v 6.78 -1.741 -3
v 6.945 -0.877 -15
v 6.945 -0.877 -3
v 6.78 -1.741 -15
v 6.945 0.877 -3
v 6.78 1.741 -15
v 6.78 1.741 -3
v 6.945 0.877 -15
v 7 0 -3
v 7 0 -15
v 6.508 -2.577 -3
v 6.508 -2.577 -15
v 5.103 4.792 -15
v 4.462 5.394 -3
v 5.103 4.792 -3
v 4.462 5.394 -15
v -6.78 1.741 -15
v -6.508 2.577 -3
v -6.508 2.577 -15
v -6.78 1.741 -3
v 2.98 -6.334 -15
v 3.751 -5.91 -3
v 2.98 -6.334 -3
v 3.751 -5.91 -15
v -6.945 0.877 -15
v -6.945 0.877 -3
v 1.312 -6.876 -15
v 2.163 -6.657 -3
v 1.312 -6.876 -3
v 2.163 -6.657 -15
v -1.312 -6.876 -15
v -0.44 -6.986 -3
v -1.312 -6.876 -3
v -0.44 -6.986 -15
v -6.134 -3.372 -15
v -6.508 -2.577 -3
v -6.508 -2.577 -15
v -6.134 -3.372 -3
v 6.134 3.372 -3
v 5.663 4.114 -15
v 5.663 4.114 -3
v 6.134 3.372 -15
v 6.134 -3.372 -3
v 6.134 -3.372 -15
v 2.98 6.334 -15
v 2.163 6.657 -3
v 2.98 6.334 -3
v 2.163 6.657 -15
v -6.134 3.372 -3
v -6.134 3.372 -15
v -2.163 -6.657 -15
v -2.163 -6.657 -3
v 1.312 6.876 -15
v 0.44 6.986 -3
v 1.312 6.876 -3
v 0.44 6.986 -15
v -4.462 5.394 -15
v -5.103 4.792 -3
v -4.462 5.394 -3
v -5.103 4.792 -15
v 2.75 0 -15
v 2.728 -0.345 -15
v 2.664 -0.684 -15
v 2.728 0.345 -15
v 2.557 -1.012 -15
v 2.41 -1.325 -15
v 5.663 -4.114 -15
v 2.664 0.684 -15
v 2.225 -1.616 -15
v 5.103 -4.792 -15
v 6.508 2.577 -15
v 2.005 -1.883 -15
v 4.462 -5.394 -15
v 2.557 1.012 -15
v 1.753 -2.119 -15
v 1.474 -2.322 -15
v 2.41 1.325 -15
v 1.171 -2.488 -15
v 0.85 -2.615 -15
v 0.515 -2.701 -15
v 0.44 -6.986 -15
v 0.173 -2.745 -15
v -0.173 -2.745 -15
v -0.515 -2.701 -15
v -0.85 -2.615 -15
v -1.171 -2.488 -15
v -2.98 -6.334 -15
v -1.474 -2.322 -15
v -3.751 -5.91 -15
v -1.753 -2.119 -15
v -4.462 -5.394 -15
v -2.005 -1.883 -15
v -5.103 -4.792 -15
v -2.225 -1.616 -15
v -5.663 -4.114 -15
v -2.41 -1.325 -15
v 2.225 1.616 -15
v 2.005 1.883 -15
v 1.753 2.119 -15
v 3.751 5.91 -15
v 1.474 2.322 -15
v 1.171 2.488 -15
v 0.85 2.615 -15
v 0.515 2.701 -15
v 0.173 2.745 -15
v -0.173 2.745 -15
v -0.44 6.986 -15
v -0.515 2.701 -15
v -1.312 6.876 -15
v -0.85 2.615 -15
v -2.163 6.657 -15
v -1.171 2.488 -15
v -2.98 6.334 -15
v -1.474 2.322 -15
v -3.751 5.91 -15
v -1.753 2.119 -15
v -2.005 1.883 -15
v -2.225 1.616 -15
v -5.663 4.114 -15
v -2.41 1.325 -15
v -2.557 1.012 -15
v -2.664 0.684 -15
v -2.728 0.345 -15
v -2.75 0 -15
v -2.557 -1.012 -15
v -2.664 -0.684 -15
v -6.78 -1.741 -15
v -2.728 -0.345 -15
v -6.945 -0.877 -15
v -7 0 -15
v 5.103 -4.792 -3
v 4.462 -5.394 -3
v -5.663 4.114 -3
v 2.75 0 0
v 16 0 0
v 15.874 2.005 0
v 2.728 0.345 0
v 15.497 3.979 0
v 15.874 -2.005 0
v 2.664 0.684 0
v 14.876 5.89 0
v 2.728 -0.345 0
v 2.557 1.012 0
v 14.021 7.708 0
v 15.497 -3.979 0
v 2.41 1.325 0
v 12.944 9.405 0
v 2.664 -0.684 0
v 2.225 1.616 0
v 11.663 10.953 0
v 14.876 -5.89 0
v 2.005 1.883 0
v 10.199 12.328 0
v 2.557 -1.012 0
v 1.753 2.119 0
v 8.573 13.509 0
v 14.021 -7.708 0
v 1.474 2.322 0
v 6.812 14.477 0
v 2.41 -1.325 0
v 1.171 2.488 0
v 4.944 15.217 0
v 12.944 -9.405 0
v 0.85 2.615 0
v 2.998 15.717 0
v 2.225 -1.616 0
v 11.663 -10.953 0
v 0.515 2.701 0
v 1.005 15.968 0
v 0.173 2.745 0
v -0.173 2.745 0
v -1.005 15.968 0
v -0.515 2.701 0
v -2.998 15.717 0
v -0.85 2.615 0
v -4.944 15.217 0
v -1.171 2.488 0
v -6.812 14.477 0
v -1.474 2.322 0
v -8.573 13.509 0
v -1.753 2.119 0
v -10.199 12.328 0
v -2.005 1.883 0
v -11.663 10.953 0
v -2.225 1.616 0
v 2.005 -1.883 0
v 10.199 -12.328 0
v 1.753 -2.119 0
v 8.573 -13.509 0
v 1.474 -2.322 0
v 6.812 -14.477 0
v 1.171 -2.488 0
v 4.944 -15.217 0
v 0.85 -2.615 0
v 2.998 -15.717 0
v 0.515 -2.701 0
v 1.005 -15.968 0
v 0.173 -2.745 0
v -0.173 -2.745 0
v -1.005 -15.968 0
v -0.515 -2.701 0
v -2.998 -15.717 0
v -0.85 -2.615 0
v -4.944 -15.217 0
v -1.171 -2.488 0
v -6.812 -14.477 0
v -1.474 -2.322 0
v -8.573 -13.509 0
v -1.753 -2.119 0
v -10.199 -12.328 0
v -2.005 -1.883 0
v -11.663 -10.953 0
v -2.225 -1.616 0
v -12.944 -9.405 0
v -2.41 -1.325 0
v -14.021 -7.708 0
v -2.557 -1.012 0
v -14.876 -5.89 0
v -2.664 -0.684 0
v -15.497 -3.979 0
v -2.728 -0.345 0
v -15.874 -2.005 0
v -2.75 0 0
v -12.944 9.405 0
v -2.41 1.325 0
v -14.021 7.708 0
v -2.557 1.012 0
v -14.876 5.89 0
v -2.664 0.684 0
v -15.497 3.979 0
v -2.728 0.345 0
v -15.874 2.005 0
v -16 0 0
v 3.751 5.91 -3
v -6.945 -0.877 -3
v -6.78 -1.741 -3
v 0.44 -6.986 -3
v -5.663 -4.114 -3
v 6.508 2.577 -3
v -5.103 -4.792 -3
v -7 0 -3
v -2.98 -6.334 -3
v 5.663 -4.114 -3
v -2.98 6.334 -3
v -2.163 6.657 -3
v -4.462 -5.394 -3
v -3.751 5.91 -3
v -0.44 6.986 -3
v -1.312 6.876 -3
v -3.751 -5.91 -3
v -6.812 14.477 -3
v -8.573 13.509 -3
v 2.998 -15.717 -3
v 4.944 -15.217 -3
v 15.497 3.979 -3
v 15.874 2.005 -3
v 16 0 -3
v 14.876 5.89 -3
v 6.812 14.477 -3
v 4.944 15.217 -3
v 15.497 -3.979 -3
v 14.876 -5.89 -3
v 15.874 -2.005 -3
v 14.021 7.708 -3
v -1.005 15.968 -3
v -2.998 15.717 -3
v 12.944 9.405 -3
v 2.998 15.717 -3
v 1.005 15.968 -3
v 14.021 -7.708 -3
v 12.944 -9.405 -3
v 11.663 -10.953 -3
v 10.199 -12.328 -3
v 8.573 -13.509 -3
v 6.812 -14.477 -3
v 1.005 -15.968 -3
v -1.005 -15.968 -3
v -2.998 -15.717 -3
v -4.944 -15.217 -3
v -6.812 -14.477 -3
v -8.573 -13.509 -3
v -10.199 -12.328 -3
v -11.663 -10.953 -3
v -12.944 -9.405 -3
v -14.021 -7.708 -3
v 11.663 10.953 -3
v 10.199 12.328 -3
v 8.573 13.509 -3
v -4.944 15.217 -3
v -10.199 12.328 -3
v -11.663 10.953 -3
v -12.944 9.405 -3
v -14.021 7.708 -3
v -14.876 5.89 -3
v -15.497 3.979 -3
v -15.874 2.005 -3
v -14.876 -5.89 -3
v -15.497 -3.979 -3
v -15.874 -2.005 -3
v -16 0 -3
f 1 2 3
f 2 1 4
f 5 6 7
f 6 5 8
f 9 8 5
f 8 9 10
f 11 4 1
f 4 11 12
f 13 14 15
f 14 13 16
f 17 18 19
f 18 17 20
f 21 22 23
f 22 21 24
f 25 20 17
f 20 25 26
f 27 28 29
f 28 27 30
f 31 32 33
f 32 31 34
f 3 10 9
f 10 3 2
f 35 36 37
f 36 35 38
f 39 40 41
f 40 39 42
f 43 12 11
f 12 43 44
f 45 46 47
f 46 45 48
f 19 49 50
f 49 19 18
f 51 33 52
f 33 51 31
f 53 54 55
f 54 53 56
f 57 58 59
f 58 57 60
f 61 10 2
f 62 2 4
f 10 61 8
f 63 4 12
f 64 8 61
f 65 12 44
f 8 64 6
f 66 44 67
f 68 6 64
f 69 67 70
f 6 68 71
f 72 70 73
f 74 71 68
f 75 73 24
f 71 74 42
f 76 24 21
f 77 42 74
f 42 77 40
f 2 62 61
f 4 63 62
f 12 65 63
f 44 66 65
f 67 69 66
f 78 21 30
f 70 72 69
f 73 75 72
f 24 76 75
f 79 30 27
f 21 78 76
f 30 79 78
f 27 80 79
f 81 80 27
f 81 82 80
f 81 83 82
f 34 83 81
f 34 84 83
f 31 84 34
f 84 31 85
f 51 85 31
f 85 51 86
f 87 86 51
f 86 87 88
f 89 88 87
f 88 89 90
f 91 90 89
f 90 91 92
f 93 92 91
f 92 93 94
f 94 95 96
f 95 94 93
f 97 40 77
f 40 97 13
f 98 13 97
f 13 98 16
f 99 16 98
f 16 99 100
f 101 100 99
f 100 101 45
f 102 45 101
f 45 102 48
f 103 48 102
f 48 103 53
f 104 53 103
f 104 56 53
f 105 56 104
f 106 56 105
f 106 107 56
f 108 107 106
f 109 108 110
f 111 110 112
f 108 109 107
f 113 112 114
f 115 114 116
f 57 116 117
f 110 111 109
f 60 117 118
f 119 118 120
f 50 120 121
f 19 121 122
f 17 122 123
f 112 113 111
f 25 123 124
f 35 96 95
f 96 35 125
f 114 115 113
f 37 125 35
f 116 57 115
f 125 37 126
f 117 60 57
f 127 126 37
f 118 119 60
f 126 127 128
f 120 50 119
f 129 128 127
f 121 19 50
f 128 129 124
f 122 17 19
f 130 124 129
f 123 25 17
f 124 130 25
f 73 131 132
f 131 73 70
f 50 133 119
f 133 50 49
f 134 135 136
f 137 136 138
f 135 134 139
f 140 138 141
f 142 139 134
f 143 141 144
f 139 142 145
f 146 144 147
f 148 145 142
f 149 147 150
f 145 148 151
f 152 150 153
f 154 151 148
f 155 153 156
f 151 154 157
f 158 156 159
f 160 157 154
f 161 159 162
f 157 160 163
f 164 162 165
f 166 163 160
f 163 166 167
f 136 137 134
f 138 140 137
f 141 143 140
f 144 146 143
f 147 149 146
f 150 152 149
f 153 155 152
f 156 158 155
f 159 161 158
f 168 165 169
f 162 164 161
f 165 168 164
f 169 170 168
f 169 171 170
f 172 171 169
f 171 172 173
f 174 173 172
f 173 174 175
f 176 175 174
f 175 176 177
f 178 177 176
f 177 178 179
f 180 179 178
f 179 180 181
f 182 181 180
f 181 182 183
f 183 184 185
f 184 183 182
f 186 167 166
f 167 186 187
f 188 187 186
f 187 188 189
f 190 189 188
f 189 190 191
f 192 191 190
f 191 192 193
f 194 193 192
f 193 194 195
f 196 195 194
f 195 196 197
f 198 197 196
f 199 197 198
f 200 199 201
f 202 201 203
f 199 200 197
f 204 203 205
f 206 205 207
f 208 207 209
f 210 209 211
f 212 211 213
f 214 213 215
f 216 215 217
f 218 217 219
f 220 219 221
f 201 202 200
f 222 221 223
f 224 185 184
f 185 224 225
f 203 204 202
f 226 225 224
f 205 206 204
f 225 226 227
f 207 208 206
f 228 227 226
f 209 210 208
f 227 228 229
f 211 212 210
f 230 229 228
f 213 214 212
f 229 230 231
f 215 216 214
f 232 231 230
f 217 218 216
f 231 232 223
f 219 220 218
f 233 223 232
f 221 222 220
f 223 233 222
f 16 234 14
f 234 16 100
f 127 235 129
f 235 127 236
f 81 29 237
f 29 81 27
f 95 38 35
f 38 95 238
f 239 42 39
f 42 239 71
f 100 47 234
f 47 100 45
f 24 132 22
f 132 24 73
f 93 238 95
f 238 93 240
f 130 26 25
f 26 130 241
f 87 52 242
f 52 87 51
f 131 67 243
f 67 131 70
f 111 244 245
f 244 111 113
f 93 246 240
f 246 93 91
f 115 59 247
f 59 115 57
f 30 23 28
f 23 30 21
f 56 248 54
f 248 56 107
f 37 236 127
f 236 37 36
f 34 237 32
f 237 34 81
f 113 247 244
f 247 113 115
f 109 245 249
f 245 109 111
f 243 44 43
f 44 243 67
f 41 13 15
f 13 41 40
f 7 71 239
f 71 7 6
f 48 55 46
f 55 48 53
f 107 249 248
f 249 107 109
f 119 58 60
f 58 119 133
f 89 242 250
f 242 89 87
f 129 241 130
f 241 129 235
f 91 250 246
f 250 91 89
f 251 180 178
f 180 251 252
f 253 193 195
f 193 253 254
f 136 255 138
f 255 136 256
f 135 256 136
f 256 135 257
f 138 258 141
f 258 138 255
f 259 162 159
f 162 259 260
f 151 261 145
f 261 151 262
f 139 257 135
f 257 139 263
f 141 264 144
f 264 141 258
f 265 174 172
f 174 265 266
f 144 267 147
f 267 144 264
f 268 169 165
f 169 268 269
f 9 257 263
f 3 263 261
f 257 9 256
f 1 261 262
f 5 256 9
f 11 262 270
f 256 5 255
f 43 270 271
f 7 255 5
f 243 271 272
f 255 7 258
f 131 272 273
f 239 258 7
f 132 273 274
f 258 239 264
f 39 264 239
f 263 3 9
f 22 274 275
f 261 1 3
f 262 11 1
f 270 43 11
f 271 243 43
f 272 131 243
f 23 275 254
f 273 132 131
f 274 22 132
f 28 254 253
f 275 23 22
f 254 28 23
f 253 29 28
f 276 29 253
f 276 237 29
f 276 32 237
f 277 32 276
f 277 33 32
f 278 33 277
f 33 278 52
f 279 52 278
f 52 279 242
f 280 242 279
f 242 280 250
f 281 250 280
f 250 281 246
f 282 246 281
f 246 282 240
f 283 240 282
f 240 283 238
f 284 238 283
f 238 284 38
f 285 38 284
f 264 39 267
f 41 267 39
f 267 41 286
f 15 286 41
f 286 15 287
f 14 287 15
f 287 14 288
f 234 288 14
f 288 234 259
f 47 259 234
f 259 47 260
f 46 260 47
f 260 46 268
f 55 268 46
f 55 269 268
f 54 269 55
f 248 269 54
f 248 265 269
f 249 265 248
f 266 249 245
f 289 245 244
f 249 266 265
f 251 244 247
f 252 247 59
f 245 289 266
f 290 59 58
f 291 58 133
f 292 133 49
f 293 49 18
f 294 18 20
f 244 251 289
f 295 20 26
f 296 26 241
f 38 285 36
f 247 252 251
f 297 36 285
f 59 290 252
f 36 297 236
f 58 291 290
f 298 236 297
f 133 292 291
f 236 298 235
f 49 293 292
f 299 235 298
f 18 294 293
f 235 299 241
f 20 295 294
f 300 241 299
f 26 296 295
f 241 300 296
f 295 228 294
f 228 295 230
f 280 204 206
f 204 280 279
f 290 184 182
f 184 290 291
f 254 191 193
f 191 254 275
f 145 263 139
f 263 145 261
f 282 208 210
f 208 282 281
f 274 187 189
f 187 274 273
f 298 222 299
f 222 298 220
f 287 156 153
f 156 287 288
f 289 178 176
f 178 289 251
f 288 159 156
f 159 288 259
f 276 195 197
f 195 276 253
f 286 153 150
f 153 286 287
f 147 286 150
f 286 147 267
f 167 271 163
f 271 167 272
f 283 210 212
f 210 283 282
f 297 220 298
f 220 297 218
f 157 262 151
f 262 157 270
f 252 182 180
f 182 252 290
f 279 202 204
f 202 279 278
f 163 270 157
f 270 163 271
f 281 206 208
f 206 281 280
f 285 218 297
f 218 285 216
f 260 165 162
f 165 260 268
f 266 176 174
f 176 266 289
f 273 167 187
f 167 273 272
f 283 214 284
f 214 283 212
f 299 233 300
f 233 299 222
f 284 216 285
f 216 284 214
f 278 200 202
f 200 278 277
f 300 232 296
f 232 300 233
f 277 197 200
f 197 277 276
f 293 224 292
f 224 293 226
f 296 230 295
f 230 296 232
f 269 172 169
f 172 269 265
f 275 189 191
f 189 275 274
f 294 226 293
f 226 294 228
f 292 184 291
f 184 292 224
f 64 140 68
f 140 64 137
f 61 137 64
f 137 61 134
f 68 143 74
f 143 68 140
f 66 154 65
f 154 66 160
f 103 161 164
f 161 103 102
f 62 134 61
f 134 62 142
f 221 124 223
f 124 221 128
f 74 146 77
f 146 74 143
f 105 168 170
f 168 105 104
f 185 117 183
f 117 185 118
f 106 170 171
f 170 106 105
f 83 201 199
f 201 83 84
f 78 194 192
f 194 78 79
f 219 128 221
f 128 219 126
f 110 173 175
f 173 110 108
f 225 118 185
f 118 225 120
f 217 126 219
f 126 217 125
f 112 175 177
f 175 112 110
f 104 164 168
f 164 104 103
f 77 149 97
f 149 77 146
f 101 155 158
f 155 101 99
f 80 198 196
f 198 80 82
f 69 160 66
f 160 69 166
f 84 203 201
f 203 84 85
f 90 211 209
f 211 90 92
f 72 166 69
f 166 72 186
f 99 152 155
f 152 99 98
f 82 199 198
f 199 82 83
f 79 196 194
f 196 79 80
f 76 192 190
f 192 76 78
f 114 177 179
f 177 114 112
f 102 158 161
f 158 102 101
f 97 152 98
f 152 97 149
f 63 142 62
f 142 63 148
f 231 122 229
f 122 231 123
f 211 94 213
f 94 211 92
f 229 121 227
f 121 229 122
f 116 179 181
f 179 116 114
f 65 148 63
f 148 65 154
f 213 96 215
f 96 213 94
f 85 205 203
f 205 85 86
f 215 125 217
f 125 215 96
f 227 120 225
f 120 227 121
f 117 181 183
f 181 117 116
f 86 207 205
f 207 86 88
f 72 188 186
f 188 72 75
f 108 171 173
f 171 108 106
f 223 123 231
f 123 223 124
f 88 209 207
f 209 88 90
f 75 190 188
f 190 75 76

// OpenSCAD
$fn = 50;


difference() {
	union() {
		translate(v = [0, 0, -15.0000000000]) {
			cylinder(h = 15, r = 7.0000000000);
		}
		translate(v = [0, 0, -3.0000000000]) {
			cylinder(h = 3, r = 16.0000000000);
		}
	}
	union() {
		#translate(v = [0, 0, -15]) {
			cylinder(h = 15, r = 2.7500000000);
		}
	}
}
